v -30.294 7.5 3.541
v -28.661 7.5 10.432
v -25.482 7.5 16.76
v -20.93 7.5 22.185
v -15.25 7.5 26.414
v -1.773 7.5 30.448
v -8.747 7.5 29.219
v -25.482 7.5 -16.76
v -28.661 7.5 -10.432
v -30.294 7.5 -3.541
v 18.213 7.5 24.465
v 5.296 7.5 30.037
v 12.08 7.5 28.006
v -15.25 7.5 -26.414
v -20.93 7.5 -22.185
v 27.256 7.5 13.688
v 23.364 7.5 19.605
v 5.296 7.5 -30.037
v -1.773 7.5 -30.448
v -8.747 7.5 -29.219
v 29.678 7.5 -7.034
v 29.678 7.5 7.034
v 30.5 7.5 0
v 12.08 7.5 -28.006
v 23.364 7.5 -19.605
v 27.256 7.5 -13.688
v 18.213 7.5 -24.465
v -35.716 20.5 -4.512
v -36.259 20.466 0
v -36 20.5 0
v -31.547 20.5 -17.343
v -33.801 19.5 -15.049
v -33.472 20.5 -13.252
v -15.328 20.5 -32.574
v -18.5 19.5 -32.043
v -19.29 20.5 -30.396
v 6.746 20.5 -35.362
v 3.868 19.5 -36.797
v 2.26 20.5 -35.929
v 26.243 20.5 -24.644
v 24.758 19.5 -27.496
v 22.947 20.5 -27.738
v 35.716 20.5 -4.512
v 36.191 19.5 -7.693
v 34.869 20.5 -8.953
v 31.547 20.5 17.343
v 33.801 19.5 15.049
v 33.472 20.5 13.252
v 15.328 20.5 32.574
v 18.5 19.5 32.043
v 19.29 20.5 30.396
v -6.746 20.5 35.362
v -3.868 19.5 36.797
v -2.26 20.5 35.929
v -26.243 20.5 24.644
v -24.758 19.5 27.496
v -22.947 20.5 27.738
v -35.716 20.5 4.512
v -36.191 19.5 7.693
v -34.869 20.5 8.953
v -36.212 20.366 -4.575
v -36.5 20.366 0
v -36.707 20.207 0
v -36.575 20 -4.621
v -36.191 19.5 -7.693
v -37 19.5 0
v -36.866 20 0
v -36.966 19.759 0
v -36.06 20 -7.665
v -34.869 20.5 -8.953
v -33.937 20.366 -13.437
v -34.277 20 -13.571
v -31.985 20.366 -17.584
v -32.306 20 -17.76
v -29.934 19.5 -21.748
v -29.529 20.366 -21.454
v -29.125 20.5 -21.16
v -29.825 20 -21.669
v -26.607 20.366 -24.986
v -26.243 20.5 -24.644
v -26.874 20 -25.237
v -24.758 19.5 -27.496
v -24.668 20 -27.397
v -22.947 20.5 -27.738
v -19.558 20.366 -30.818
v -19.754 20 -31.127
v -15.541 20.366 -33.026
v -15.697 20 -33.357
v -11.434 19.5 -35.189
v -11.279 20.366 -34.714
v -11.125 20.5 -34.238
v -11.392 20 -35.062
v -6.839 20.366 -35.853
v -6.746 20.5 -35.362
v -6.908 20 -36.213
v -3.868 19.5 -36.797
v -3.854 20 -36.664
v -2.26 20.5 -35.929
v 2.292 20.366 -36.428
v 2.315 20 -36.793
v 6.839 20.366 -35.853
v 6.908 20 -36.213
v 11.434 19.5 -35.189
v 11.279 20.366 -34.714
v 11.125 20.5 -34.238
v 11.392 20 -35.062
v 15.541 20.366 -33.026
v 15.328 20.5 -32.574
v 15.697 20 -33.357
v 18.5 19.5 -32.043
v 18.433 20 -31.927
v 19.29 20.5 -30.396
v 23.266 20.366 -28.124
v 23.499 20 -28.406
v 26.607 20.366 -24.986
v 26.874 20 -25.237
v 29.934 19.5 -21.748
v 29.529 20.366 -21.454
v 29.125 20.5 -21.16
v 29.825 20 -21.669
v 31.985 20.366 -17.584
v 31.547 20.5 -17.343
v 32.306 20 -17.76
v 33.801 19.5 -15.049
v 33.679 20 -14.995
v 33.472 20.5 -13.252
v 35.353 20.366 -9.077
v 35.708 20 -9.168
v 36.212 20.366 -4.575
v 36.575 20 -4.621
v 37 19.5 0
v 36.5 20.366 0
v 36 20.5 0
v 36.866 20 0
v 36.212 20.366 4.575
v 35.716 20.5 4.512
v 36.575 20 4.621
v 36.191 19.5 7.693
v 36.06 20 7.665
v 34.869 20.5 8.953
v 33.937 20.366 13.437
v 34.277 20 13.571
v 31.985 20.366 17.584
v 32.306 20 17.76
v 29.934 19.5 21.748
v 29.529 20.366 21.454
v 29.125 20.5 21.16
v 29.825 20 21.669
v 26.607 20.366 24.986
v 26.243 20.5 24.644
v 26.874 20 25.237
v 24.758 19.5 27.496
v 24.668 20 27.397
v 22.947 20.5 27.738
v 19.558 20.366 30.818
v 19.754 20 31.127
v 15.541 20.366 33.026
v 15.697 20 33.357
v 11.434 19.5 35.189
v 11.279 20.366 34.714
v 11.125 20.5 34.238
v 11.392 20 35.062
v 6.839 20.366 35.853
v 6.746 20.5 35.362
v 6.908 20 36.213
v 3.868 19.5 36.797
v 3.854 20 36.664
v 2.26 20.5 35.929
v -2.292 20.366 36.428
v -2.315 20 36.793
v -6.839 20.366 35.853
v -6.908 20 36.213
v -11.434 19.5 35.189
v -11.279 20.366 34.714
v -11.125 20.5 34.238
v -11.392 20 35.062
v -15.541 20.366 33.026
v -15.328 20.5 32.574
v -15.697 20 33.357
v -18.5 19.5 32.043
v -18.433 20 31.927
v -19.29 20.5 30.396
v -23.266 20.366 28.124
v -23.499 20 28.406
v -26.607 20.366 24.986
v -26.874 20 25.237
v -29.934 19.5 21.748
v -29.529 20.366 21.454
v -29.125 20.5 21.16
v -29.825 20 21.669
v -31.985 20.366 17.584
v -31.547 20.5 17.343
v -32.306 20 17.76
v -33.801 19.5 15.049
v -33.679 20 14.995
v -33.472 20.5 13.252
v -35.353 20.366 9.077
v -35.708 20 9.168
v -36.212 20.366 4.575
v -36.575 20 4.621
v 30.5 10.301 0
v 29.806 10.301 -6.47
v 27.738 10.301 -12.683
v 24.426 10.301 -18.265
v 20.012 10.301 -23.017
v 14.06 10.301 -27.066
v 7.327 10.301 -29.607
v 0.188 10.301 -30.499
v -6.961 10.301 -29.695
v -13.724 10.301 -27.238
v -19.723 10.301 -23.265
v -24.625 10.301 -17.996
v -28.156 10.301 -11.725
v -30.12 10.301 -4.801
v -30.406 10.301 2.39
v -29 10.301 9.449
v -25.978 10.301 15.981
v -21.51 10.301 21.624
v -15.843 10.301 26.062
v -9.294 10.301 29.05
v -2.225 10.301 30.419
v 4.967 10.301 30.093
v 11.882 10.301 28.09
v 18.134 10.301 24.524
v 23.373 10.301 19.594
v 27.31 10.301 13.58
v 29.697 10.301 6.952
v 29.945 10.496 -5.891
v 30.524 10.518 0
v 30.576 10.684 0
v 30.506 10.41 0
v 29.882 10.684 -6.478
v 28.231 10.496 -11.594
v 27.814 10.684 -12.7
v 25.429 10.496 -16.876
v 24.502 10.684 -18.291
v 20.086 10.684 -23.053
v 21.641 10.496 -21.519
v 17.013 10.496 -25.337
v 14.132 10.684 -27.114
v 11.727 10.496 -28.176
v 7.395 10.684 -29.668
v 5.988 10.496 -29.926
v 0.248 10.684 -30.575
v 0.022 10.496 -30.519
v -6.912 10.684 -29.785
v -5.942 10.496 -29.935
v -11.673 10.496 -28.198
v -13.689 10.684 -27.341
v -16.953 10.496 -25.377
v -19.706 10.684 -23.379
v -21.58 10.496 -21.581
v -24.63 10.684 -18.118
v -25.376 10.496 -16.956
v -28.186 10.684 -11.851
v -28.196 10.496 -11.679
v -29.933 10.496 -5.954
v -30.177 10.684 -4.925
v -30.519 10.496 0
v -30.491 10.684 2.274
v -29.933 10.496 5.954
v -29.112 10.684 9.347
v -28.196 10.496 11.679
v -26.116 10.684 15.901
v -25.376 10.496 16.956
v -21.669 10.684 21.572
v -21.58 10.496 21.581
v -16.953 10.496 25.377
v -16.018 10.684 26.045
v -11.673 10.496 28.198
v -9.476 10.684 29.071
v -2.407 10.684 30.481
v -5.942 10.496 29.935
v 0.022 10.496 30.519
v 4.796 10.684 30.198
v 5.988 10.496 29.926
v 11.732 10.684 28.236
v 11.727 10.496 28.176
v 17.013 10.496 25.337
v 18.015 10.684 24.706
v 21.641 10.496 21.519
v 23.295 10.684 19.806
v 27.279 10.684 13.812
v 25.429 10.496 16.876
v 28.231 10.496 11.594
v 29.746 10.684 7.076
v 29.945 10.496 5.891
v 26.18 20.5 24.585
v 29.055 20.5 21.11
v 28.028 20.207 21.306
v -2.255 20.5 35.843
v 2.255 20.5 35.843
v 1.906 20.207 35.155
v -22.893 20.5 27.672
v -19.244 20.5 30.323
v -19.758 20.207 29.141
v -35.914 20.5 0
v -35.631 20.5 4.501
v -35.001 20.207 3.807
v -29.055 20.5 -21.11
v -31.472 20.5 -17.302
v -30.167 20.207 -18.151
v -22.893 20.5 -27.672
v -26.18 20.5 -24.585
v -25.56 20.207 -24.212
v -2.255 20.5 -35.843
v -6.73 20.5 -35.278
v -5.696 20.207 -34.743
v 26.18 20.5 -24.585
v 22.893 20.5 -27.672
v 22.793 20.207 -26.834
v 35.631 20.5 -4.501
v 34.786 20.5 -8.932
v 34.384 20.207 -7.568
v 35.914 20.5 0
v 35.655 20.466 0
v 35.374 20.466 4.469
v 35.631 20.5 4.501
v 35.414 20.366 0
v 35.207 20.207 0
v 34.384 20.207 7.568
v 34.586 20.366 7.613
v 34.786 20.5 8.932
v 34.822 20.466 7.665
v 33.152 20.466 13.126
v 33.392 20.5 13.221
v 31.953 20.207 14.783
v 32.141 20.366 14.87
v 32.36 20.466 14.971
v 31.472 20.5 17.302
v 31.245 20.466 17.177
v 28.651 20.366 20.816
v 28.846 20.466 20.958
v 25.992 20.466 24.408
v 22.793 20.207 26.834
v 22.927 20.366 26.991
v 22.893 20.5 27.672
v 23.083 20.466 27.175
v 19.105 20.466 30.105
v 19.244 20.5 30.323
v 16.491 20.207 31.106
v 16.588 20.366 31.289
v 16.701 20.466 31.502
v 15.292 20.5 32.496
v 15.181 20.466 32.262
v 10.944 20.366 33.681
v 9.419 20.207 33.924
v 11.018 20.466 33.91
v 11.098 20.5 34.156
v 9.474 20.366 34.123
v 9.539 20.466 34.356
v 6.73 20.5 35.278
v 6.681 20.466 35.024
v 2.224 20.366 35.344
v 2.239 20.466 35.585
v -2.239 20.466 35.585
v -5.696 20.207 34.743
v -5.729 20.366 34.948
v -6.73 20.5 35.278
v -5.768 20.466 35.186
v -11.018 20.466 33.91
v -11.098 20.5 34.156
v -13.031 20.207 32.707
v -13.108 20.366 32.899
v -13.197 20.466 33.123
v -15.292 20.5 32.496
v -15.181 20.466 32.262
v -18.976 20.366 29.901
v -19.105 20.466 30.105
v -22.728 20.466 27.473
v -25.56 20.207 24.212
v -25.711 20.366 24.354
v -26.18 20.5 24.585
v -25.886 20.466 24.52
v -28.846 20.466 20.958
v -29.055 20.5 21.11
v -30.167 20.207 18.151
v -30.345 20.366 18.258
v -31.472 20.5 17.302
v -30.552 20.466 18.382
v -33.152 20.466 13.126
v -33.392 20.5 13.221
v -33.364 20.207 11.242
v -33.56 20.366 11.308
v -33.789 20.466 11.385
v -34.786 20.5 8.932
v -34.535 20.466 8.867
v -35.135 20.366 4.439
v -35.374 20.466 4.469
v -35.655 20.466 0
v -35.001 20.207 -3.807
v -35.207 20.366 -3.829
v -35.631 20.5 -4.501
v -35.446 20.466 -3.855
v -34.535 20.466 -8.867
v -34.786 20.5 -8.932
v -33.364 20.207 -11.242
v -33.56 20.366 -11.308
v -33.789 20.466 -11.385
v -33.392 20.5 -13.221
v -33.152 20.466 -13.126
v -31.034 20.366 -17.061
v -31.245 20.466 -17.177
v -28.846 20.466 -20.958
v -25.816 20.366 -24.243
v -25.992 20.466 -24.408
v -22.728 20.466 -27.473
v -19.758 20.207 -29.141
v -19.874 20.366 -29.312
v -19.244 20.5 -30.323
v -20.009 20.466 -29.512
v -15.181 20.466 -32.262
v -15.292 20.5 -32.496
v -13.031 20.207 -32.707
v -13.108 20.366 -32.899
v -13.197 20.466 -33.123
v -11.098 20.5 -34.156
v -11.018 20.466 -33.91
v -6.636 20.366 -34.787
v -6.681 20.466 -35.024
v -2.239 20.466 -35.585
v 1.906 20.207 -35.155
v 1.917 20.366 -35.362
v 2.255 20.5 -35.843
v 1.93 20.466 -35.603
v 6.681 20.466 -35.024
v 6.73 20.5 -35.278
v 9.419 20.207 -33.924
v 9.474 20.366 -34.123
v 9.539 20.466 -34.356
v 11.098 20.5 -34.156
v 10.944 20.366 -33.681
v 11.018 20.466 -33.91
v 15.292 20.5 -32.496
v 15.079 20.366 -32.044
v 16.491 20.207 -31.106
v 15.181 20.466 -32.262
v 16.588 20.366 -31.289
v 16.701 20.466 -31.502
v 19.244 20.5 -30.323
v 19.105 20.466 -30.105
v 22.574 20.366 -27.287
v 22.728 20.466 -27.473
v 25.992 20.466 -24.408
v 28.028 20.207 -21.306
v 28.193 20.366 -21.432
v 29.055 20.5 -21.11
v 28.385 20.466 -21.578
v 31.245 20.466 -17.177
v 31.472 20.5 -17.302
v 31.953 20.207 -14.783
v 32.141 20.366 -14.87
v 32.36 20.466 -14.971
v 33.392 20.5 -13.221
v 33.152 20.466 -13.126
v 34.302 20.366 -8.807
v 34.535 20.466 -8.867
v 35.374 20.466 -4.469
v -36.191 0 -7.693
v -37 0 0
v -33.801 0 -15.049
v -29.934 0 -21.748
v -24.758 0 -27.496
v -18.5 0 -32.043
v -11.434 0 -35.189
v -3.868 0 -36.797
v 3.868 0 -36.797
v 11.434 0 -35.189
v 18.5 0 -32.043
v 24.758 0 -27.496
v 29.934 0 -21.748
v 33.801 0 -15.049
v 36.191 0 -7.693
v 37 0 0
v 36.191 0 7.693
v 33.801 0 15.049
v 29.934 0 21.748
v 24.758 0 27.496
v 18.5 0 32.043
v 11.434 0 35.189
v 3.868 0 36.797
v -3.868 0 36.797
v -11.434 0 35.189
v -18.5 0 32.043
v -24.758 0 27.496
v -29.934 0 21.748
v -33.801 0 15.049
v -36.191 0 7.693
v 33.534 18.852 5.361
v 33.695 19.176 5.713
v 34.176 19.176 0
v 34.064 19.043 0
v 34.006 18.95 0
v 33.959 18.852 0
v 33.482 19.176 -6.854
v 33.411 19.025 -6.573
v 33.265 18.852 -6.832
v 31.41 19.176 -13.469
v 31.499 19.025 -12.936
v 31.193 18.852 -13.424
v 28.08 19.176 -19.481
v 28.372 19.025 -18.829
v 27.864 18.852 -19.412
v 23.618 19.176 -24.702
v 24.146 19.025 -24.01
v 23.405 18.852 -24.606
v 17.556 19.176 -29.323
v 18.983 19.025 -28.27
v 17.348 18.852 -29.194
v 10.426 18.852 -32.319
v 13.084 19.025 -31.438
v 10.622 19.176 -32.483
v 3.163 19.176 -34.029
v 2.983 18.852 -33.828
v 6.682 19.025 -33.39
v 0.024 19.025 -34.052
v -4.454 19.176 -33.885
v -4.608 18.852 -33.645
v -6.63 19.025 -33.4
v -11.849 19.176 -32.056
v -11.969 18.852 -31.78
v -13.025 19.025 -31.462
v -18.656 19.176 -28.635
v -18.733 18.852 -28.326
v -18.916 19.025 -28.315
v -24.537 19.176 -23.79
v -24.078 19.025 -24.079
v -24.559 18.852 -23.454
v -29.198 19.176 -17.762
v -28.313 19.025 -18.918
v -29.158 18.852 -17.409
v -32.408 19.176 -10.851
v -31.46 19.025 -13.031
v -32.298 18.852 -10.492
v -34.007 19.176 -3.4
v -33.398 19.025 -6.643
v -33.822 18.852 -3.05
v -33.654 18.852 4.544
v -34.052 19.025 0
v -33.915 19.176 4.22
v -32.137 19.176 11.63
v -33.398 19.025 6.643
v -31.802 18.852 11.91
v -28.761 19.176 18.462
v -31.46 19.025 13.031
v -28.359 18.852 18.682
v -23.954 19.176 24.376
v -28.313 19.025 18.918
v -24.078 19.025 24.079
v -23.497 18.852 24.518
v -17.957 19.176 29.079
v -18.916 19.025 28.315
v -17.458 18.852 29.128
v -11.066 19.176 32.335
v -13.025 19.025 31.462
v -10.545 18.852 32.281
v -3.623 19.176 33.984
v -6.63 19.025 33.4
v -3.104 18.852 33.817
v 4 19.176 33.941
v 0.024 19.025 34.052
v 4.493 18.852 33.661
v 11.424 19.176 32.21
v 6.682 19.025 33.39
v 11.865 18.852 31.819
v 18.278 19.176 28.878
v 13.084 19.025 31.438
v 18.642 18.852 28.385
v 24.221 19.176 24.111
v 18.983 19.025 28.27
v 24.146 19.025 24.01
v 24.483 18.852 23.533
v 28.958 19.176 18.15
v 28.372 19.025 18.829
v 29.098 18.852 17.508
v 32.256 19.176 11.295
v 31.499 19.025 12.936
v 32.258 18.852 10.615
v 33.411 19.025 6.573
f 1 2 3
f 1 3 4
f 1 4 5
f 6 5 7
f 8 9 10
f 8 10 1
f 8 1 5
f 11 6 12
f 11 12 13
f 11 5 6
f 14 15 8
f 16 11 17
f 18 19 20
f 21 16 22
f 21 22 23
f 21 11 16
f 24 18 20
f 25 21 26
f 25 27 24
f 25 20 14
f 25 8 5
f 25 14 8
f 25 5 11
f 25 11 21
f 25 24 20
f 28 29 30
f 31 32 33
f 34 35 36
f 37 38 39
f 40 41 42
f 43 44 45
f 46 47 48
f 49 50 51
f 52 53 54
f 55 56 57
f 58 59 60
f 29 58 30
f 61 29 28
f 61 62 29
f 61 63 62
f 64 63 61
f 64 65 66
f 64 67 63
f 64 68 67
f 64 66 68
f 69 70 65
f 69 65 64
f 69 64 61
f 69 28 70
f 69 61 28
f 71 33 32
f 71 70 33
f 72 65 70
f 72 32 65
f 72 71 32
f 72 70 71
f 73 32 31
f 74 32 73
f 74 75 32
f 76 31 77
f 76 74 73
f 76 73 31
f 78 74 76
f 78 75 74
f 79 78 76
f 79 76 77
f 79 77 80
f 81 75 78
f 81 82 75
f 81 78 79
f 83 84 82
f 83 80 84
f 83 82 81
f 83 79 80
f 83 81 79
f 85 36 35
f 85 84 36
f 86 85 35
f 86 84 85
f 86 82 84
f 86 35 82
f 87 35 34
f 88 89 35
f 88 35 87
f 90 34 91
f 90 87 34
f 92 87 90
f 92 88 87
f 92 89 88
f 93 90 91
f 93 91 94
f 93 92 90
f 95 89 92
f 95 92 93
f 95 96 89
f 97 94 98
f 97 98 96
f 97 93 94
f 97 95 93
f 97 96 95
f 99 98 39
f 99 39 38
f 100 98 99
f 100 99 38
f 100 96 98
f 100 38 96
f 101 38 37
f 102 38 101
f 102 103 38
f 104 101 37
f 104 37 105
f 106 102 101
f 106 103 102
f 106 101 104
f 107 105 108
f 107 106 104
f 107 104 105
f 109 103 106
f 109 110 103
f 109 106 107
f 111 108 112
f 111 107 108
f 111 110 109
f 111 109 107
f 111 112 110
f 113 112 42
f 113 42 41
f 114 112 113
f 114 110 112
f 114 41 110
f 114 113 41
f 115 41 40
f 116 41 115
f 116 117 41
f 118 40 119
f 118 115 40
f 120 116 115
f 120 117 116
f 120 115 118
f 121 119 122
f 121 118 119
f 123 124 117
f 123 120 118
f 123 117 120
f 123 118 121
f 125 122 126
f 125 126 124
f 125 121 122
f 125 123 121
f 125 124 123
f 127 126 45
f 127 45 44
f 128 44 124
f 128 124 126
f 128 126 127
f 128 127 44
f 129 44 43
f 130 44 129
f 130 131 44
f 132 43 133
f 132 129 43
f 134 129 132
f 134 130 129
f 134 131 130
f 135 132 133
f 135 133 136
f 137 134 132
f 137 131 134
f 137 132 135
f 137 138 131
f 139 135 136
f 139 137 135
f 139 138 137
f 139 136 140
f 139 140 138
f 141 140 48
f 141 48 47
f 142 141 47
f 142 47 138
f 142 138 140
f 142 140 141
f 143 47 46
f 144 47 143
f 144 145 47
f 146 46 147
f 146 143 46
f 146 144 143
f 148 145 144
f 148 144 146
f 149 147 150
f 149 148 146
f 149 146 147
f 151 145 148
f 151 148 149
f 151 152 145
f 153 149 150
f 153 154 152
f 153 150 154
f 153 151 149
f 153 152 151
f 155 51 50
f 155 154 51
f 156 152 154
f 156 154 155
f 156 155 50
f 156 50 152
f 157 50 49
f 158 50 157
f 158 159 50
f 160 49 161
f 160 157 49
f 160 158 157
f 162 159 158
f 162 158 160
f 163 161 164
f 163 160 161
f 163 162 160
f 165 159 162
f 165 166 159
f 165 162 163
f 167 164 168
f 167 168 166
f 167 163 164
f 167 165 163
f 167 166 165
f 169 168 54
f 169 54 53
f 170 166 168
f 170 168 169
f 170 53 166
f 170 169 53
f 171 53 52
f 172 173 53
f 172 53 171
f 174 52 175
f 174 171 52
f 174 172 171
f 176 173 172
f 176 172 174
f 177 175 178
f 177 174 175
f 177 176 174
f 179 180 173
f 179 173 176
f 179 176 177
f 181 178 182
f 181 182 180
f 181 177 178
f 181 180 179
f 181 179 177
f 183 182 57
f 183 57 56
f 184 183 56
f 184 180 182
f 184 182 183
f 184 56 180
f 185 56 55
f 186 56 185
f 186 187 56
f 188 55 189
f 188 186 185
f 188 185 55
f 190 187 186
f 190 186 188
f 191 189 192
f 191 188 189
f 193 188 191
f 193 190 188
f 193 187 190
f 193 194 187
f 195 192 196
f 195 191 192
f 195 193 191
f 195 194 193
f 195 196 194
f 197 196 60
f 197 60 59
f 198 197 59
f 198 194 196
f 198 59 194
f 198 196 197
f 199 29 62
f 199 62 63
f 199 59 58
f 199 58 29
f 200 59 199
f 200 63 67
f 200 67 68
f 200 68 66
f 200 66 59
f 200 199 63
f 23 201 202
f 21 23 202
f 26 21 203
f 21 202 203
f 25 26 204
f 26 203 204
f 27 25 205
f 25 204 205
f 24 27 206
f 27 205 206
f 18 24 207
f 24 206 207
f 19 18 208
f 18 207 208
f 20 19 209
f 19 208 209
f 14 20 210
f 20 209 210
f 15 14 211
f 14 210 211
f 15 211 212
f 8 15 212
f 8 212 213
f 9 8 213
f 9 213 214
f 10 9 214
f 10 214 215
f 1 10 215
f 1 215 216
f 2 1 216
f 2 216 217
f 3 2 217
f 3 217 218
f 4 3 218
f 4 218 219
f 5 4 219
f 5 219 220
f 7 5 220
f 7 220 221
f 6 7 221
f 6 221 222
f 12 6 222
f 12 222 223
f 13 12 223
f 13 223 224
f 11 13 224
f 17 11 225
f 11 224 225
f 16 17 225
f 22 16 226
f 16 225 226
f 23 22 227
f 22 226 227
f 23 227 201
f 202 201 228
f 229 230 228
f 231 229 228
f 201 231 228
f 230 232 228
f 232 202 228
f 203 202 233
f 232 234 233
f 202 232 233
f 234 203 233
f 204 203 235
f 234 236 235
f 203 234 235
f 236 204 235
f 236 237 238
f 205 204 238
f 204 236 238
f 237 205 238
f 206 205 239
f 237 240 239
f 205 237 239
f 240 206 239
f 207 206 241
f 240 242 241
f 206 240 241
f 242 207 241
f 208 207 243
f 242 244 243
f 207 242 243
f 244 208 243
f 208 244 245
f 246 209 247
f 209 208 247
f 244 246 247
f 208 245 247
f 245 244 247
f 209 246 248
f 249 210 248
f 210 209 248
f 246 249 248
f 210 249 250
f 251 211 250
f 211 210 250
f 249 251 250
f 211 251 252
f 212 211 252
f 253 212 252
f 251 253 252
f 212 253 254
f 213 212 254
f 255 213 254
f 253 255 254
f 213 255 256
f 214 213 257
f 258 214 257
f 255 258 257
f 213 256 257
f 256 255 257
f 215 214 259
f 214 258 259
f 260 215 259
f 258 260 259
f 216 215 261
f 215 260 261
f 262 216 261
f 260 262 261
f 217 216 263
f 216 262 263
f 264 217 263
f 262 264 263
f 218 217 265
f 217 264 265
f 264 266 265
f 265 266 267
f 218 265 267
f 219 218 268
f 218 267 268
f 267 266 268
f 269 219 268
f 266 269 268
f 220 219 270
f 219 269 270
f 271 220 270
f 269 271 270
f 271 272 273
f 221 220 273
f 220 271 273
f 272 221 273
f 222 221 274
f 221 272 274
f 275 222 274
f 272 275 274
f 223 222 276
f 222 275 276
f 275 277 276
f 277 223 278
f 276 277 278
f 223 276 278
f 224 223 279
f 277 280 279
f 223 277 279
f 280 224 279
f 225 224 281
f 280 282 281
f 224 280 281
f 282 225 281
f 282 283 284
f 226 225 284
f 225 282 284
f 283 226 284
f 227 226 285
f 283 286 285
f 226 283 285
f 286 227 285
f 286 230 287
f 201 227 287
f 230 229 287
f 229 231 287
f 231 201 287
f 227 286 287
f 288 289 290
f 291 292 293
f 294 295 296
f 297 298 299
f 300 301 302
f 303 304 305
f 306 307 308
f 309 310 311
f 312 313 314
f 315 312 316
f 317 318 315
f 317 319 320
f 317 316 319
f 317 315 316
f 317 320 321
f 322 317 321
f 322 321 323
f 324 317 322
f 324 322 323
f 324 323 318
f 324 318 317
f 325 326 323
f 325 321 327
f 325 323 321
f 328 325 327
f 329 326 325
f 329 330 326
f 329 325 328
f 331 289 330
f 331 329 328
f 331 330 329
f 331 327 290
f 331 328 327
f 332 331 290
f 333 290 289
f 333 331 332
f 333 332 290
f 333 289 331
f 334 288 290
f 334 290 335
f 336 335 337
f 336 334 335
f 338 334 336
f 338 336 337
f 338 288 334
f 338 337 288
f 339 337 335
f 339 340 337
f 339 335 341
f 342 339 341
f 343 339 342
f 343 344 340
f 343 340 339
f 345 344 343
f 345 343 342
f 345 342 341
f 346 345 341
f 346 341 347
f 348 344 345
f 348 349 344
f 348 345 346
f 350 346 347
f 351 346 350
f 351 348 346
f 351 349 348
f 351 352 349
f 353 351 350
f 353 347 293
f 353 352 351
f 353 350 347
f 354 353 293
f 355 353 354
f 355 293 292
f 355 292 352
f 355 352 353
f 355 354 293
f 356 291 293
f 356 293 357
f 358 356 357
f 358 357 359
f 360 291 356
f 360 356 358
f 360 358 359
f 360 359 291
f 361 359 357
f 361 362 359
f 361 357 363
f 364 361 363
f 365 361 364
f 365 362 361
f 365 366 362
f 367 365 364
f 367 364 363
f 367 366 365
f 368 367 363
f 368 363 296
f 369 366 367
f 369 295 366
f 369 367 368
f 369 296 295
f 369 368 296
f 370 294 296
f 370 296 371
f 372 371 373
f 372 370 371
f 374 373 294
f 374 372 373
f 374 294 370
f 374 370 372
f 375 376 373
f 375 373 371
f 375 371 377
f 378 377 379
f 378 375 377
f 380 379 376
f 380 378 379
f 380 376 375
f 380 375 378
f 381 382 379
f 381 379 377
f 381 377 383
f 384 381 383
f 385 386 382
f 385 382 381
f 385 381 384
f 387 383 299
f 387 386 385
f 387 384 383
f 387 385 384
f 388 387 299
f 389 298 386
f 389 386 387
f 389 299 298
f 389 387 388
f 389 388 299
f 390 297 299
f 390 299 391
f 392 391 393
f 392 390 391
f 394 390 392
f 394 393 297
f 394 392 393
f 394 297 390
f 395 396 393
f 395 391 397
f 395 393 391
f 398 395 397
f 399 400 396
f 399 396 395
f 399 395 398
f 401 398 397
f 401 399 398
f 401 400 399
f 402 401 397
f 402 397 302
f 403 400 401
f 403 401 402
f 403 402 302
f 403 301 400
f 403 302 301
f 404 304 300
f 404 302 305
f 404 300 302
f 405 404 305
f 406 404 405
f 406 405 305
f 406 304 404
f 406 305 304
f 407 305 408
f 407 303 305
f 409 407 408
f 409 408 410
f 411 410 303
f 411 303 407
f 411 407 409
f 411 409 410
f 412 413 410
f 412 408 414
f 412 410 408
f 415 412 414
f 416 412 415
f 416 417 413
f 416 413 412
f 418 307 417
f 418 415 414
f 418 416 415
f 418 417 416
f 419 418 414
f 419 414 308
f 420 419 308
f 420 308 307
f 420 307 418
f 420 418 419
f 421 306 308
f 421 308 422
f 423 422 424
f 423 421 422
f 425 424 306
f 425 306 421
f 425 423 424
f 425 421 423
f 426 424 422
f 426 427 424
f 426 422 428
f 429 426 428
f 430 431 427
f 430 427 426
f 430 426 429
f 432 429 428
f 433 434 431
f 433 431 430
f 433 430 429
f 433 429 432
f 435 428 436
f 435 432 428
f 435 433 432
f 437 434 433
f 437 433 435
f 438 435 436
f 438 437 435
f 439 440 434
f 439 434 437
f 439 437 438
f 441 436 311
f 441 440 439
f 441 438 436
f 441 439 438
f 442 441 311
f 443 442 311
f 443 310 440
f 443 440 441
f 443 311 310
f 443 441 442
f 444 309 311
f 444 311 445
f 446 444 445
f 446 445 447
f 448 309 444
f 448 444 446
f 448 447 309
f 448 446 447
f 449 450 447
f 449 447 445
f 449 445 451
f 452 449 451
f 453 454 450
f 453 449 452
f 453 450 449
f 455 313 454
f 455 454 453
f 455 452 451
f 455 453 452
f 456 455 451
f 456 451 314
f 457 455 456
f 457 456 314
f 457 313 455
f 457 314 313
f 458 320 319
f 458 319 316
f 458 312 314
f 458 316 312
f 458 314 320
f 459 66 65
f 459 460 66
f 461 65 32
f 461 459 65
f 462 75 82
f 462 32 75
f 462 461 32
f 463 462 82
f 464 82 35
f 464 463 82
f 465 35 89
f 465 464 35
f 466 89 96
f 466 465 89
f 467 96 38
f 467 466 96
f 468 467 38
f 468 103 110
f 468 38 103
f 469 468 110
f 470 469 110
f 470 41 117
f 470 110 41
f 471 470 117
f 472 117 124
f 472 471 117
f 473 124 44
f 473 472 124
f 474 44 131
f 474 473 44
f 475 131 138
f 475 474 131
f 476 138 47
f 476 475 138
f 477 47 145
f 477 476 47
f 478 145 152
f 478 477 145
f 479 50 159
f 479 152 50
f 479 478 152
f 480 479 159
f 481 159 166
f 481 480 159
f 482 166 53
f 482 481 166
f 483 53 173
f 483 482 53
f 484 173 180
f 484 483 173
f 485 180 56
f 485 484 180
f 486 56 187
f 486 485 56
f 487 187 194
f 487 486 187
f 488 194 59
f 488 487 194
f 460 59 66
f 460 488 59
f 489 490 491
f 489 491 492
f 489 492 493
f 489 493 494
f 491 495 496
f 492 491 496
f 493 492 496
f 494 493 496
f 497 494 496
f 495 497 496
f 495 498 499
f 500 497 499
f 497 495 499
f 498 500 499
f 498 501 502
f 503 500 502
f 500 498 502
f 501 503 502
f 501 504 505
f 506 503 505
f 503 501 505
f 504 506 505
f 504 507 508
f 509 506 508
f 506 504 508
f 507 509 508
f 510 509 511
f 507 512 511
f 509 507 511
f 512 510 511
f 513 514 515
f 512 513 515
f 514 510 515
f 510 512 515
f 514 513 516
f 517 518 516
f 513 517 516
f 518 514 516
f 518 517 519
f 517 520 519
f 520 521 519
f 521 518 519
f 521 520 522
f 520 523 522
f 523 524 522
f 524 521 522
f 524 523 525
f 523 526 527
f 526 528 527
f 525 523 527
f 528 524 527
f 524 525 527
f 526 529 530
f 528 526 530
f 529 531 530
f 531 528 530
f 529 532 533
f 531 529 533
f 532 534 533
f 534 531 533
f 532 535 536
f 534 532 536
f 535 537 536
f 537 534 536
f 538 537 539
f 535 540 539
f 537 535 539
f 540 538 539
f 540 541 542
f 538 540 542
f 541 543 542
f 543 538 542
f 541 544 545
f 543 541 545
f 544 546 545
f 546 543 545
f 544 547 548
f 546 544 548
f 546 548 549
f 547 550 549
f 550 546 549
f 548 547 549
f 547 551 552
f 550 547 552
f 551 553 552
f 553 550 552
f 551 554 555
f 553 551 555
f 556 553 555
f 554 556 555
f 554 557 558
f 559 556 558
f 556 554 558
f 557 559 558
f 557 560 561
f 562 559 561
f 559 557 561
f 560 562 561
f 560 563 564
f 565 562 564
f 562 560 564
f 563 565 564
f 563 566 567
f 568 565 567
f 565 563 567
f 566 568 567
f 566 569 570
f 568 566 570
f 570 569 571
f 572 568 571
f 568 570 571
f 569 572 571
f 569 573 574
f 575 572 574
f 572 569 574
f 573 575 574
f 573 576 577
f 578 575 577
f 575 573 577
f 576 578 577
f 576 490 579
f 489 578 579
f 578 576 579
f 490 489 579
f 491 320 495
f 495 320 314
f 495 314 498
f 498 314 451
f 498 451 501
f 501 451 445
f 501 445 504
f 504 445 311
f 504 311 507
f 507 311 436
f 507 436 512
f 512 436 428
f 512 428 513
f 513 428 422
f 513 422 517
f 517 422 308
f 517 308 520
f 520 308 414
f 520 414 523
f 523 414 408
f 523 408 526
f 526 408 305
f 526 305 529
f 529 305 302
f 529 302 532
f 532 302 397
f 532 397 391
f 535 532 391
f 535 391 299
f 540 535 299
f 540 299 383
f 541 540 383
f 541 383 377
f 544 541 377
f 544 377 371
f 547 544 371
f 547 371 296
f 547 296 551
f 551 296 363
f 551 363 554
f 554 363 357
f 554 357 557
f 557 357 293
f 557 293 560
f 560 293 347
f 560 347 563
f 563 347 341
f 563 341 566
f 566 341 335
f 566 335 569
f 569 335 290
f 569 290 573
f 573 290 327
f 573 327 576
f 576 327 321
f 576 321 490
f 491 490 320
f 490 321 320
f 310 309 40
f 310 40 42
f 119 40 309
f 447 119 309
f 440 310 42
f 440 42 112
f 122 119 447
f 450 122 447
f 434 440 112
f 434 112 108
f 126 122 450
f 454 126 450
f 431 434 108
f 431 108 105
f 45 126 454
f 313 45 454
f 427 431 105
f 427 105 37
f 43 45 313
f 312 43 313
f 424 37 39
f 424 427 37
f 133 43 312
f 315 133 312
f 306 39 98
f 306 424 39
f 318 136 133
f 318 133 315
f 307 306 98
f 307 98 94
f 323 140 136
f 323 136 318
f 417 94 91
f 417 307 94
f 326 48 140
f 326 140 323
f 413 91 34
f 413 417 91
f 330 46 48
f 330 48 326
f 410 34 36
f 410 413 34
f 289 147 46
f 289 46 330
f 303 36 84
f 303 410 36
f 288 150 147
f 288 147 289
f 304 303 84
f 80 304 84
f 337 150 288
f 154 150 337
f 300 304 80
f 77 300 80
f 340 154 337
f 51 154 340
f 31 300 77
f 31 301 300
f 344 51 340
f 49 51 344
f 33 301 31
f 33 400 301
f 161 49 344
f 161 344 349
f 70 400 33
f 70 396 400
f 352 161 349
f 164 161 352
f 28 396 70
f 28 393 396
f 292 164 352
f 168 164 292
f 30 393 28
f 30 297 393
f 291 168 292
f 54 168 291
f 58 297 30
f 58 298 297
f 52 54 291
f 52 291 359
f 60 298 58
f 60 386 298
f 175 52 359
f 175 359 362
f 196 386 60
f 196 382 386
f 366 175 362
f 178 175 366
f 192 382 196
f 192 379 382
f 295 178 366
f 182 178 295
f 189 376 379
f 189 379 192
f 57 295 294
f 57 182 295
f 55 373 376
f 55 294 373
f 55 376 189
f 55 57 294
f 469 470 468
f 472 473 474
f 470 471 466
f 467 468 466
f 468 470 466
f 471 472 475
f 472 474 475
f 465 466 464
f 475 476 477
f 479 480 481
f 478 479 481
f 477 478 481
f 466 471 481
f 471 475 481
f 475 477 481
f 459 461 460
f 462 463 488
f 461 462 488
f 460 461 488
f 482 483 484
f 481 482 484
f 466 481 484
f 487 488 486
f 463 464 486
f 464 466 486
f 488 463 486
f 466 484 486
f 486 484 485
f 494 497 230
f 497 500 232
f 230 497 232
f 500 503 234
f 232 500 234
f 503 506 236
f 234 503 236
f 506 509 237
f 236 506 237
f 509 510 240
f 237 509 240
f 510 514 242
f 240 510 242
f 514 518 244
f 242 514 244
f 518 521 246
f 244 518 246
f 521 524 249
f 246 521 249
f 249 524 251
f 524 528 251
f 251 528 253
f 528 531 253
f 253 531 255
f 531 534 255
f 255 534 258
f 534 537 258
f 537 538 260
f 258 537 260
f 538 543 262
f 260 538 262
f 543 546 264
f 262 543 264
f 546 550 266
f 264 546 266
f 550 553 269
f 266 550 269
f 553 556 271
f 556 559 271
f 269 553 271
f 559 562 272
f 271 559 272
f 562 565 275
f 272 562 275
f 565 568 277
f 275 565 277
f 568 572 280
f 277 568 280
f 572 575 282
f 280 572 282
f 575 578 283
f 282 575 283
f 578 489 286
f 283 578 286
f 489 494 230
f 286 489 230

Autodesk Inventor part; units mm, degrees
ref_plane "YZ Plane" through (0, 0, 0) normal (1, 0, 0) x (0, 1, 0)
ref_plane "XZ Plane" through (0, 0, 0) normal (0, 1, 0) x (-1, 0, 0)
ref_plane "XY Plane" through (0, 0, 0) normal (0, 0, 1) x (1, 0, 0)
sketch "Skizze1" plane through (0, 0, 0) normal (0, 1, 0) x (-1, 0, 0)
  circle A0 centre (0, 0) radius 37
  dimension "d0" = 74
extrude "Extrusion1" add sketch "Skizze1" along normal blind 20.5
sketch "Skizze2" plane through (0, 20.5, 0) normal (0, 1, 0) x (1, 0, 0)
  circle A0 centre (0, 0) radius 30.5
  dimension "d3" = 61
extrude "Extrusion2" cut sketch "Skizze2" against normal blind 13
chamfer "Fase1" distance 5 angle 45 1 edges at (-30.5, 20.5, 0)
chamfer "Fase2" distance 5 angle 45 1 edges at (-30.5, 15.5, 0)
fillet "Rundung2" radius 1 2 edges at (37, 20.5, 0) (-35.5, 20.5, 0)
fillet "Rundung3" radius 1 2 edges at (-34.0355, 19.0355, 0) (-30.5, 10.5, 0)
properties part number "bat" material "ABS-Kunststoff"
